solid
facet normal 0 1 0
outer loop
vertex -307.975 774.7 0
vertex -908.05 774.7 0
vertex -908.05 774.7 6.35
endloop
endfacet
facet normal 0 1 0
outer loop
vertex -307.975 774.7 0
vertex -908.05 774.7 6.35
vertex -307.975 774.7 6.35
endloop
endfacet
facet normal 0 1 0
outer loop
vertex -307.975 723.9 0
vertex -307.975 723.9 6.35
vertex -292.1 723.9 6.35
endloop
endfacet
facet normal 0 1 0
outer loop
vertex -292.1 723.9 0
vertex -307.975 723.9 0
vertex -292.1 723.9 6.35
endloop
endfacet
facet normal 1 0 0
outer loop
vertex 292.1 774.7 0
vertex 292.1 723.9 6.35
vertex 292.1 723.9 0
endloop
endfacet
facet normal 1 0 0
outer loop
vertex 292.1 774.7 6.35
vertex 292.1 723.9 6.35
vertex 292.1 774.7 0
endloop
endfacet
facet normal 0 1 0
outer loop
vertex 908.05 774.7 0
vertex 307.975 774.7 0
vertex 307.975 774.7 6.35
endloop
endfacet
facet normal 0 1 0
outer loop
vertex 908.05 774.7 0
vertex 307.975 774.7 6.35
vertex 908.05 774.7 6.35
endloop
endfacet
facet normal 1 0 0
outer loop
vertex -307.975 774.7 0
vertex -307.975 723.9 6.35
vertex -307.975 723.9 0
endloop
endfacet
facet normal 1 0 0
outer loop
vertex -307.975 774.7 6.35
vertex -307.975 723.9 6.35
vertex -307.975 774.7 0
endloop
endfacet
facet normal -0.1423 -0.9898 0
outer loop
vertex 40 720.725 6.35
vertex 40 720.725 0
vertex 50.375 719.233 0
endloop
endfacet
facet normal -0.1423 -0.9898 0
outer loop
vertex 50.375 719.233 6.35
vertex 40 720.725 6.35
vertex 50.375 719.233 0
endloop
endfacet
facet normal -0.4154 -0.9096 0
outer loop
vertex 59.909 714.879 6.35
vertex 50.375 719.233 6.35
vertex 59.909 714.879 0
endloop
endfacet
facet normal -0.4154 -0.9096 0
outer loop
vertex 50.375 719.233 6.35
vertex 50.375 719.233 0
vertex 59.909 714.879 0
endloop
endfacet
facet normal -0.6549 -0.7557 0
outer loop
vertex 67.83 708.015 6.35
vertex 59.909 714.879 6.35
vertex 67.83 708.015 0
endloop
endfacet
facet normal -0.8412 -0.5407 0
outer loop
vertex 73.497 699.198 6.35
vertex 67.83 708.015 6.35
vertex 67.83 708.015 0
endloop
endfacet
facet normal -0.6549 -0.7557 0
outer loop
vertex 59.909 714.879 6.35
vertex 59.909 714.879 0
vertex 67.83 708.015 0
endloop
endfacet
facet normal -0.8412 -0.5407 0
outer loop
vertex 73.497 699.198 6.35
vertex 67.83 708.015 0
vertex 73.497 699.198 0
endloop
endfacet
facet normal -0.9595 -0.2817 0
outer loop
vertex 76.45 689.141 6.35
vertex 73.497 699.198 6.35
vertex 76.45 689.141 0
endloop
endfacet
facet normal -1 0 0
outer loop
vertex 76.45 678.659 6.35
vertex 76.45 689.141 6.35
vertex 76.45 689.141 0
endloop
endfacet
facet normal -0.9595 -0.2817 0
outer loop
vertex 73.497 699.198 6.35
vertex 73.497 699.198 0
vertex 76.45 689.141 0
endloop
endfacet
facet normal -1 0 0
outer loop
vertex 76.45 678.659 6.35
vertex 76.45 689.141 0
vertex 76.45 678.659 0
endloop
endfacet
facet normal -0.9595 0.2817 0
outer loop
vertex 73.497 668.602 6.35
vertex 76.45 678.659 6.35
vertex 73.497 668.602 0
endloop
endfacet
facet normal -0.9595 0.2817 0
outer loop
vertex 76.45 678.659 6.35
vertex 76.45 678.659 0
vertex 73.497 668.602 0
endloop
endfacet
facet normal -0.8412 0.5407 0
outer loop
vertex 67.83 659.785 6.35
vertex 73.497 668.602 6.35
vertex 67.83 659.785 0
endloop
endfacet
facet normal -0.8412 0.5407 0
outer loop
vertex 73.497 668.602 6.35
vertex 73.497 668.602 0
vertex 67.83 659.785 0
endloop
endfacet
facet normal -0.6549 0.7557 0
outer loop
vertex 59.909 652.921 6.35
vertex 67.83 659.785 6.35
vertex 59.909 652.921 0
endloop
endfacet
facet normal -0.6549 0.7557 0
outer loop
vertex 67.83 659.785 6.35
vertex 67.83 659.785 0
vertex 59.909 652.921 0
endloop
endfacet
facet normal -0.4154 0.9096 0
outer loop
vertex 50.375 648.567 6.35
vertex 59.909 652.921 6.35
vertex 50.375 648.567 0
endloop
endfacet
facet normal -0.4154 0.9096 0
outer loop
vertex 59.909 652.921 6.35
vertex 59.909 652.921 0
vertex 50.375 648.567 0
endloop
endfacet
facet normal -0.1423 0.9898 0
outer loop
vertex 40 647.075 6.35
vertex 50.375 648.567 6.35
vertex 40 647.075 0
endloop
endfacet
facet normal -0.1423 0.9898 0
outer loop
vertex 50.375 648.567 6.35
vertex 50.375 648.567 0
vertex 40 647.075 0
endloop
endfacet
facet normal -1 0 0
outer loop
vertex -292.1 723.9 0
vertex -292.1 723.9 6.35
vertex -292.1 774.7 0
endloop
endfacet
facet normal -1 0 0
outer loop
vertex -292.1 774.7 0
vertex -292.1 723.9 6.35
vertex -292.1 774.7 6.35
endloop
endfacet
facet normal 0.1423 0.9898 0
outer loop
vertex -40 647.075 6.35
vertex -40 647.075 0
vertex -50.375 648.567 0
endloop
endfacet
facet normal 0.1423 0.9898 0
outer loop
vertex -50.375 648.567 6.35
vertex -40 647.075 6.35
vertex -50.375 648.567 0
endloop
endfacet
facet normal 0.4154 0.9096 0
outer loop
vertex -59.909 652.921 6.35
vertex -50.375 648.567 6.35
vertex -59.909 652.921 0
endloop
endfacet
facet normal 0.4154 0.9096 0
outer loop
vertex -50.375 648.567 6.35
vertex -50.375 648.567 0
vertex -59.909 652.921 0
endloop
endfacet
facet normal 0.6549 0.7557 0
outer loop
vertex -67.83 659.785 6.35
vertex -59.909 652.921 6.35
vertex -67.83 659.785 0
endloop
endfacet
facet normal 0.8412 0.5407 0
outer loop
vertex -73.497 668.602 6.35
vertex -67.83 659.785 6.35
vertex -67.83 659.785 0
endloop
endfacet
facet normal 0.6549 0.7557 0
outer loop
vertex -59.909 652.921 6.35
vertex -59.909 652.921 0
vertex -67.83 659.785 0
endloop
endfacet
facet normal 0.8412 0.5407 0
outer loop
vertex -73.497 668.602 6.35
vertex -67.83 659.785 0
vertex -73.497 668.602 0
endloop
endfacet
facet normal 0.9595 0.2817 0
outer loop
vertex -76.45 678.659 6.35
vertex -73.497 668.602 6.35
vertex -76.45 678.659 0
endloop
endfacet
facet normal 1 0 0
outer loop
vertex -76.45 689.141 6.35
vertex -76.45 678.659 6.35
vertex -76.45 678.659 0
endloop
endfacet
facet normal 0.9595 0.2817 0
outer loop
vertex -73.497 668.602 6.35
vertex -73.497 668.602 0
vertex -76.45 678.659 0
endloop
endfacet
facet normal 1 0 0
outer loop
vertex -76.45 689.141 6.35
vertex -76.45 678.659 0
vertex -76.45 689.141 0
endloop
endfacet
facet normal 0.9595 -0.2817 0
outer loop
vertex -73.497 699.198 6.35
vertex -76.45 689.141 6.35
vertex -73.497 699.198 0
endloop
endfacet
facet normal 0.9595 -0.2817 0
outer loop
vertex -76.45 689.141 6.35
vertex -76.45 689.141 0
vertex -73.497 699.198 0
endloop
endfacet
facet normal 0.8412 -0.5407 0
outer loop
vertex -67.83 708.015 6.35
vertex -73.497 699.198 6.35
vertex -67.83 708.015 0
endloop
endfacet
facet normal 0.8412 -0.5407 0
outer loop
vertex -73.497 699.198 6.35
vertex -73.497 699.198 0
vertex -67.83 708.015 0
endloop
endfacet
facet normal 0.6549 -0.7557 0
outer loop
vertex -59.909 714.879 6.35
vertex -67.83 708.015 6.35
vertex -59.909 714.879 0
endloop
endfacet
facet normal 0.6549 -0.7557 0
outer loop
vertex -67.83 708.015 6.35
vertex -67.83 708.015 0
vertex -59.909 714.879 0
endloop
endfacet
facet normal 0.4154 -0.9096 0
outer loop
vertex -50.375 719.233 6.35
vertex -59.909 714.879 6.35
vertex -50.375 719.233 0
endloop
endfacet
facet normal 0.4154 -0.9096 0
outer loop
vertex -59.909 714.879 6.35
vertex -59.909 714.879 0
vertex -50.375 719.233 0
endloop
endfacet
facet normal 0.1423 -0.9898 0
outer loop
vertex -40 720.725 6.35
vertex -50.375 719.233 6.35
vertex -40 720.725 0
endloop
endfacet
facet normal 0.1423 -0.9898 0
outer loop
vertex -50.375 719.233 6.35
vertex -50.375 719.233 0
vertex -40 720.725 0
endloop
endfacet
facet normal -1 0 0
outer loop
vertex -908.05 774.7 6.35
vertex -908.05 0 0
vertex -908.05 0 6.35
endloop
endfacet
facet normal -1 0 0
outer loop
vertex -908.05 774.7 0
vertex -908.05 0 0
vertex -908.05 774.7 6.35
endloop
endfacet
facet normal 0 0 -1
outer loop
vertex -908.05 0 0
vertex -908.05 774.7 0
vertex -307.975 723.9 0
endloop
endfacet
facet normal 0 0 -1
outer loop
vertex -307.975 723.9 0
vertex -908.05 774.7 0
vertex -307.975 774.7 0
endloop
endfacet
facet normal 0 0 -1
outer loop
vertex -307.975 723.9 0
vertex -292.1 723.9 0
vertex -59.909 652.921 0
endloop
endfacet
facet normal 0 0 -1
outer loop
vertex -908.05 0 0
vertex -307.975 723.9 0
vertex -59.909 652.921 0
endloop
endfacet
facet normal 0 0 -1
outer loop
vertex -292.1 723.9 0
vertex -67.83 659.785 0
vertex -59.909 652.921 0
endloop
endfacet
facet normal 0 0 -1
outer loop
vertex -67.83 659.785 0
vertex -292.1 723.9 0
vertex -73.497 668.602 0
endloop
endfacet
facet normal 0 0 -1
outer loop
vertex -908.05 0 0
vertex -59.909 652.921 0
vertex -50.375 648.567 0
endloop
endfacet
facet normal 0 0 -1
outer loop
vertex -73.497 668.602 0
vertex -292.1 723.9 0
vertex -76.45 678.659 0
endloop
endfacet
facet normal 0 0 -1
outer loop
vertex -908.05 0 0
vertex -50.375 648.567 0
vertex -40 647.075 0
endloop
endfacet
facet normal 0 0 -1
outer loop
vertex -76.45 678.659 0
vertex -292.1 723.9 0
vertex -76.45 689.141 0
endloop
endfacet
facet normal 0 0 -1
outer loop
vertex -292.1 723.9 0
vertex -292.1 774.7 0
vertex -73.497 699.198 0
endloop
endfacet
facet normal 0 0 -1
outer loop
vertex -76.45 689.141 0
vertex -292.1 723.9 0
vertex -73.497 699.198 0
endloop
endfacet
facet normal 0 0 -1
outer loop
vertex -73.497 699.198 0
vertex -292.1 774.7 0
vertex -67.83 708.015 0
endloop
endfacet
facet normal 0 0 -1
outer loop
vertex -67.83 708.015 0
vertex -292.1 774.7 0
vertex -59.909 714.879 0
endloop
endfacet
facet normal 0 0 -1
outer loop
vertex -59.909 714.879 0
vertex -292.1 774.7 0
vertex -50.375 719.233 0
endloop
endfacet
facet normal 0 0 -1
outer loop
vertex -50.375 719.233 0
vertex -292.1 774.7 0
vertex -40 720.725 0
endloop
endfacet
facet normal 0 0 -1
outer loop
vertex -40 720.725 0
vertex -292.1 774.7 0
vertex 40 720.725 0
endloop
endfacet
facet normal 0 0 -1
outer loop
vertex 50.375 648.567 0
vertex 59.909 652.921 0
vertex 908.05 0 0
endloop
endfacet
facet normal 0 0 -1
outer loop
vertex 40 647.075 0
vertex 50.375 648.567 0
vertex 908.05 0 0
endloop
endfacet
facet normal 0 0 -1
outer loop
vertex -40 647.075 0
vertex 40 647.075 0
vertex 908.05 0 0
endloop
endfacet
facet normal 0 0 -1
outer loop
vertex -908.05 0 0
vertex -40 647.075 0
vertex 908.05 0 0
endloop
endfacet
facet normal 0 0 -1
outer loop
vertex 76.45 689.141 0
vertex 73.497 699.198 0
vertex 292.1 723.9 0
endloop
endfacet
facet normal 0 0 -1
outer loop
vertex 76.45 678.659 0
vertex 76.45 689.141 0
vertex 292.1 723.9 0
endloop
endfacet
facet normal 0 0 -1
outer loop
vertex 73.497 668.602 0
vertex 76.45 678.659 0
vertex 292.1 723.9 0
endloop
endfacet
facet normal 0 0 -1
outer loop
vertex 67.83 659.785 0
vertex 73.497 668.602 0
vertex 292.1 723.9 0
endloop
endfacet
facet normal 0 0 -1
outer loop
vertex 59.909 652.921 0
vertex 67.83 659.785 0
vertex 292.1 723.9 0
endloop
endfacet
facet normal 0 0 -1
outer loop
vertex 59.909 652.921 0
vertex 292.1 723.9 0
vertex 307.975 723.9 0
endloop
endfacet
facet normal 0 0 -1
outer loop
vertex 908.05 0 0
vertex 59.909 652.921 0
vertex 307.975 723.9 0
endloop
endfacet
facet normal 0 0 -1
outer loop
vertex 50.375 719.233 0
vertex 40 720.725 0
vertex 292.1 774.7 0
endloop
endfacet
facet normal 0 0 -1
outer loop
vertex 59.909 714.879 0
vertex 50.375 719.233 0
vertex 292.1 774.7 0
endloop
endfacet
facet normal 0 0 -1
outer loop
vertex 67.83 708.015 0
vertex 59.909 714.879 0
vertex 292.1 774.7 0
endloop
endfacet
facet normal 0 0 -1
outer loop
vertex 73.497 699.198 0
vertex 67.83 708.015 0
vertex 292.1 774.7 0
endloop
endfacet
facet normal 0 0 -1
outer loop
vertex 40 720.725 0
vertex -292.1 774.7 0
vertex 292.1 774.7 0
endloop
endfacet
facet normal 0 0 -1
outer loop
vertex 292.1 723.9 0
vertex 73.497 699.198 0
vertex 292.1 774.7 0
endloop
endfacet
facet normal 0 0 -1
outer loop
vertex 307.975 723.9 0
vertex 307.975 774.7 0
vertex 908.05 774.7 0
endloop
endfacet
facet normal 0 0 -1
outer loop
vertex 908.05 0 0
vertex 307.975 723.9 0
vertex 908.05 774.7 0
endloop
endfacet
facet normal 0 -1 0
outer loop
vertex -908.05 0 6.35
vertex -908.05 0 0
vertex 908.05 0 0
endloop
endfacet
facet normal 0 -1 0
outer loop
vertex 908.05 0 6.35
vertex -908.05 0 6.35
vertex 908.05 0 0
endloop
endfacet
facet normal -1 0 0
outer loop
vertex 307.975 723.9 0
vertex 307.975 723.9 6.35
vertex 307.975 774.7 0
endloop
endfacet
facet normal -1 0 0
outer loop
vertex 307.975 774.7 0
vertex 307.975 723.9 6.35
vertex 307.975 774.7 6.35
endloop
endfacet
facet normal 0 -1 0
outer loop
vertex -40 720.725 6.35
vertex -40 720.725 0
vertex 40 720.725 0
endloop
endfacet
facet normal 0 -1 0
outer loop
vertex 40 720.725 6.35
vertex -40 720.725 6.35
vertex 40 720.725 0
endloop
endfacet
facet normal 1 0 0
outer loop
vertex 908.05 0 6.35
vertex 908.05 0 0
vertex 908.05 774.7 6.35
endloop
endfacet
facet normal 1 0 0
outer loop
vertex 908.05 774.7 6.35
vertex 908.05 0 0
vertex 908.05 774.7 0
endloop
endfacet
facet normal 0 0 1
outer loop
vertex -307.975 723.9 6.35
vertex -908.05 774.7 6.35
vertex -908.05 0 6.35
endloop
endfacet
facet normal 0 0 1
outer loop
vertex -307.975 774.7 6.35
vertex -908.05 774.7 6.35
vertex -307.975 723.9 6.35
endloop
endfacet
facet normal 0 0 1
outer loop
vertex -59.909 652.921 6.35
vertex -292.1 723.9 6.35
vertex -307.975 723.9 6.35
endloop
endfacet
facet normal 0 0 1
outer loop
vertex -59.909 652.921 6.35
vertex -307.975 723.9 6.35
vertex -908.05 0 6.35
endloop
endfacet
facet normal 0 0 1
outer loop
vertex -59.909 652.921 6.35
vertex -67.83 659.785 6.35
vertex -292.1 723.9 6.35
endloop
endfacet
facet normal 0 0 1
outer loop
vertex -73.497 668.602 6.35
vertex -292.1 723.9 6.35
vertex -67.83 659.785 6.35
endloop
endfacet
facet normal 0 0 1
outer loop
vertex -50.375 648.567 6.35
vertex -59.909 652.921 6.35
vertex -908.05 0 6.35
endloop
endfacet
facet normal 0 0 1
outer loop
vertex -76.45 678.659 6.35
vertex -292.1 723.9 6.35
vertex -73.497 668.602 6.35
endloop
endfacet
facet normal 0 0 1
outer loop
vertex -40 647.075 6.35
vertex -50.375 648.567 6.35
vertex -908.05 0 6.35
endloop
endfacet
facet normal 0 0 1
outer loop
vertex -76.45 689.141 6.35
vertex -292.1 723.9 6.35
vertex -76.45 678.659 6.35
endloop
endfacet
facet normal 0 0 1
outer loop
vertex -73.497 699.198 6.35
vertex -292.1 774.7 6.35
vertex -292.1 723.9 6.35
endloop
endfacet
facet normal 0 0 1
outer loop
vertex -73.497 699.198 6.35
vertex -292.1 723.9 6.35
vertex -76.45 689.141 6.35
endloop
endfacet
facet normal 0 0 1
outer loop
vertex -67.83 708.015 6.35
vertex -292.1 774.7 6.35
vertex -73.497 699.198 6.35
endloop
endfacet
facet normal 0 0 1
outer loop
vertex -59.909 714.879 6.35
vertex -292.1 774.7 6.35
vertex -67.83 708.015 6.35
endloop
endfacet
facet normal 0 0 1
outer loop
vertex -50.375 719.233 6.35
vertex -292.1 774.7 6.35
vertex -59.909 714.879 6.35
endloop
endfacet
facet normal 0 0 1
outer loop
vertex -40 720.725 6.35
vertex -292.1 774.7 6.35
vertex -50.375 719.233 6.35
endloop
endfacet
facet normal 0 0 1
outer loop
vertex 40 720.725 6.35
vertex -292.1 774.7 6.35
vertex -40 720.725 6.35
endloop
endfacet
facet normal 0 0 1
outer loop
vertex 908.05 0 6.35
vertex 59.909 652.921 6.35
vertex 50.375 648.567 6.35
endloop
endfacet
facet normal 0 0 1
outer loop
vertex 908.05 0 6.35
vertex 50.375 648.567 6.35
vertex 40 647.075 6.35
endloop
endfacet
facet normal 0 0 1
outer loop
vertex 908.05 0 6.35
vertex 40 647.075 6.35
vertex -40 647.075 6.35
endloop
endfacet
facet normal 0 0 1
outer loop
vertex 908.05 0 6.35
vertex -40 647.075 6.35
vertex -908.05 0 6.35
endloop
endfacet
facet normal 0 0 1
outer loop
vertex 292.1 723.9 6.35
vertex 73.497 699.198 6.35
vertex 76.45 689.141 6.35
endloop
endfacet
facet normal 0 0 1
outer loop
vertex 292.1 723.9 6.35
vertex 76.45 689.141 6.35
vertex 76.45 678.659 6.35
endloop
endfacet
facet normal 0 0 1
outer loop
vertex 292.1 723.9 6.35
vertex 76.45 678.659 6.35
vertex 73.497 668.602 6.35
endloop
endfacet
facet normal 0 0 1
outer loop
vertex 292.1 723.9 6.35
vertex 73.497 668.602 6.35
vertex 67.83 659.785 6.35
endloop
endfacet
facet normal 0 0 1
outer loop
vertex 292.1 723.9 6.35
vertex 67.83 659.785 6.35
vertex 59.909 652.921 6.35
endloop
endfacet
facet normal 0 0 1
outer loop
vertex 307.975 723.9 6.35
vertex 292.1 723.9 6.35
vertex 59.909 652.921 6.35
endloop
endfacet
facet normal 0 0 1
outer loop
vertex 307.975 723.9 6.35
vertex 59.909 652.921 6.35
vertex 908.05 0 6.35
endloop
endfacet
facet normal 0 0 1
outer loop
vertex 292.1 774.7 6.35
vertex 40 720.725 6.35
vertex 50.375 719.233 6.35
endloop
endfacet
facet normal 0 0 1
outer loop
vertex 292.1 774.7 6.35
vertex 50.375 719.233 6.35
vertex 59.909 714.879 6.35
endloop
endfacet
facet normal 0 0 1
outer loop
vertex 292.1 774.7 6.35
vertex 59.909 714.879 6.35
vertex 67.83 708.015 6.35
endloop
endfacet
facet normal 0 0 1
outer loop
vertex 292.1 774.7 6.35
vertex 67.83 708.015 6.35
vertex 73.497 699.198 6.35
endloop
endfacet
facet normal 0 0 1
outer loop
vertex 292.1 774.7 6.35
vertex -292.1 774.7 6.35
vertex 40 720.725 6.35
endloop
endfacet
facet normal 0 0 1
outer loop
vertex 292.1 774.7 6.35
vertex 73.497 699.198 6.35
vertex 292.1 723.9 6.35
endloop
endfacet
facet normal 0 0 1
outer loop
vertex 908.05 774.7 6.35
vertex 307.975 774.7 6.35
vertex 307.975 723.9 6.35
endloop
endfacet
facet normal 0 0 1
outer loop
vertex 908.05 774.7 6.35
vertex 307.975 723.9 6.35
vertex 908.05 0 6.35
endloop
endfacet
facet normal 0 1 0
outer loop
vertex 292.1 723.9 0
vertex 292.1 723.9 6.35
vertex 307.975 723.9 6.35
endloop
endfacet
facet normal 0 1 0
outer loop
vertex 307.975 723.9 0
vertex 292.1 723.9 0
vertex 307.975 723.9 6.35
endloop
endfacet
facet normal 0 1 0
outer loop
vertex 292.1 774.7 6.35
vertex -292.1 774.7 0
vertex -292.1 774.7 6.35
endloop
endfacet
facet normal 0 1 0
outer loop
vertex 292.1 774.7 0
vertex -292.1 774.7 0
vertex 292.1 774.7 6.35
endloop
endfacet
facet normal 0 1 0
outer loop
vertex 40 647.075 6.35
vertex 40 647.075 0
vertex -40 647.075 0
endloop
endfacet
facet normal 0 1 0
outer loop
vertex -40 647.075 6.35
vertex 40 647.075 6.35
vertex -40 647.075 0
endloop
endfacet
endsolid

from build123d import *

# Parameters (mm, degrees)
SKETCH1_W         = 1816.1
SKETCH1_H         = 774.7
BASE_DEPTH        = 6.35
SKETCH2_W         = 15.875
SKETCH2_H         = 50.8
RIB_RELIEF_DEPTH  = 1194.631105074
CUTOUT_DEPTH      = 1194.631105074
CUTOUT_DEPTH_BACK = 1194.631105074


with BuildPart() as part:
    # Sketch1 → base (new body)
    with BuildSketch(Plane.XY):
        with Locations((0, 387.35)):
            Rectangle(SKETCH1_W, SKETCH1_H)
    extrude(amount=BASE_DEPTH)

    # Sketch2 → rib-relief (cut, through all)
    with BuildSketch(Plane.XY.offset(6.35)):
        with Locations((-300.0375, 749.3)):
            Rectangle(SKETCH2_W, SKETCH2_H)
        with Locations((300.0375, 749.3)):
            Rectangle(SKETCH2_W, SKETCH2_H)
    extrude(amount=-RIB_RELIEF_DEPTH, mode=Mode.SUBTRACT)

    # Sketch3 → cutout (cut, two sides: drawn at the far end of the back side and taken through both)
    with BuildSketch(Plane.XY.offset(6.35).offset(-CUTOUT_DEPTH_BACK)):
        with BuildLine():
            Line((-40, 720.725), (40, 720.725))
            ThreePointArc((40, 720.725), (76.825, 683.9), (40, 647.075))
            Line((40, 647.075), (-40, 647.075))
            ThreePointArc((-40, 647.075), (-76.825, 683.9), (-40, 720.725))
        make_face()
    extrude(amount=CUTOUT_DEPTH + CUTOUT_DEPTH_BACK, mode=Mode.SUBTRACT)


solid = part.part
